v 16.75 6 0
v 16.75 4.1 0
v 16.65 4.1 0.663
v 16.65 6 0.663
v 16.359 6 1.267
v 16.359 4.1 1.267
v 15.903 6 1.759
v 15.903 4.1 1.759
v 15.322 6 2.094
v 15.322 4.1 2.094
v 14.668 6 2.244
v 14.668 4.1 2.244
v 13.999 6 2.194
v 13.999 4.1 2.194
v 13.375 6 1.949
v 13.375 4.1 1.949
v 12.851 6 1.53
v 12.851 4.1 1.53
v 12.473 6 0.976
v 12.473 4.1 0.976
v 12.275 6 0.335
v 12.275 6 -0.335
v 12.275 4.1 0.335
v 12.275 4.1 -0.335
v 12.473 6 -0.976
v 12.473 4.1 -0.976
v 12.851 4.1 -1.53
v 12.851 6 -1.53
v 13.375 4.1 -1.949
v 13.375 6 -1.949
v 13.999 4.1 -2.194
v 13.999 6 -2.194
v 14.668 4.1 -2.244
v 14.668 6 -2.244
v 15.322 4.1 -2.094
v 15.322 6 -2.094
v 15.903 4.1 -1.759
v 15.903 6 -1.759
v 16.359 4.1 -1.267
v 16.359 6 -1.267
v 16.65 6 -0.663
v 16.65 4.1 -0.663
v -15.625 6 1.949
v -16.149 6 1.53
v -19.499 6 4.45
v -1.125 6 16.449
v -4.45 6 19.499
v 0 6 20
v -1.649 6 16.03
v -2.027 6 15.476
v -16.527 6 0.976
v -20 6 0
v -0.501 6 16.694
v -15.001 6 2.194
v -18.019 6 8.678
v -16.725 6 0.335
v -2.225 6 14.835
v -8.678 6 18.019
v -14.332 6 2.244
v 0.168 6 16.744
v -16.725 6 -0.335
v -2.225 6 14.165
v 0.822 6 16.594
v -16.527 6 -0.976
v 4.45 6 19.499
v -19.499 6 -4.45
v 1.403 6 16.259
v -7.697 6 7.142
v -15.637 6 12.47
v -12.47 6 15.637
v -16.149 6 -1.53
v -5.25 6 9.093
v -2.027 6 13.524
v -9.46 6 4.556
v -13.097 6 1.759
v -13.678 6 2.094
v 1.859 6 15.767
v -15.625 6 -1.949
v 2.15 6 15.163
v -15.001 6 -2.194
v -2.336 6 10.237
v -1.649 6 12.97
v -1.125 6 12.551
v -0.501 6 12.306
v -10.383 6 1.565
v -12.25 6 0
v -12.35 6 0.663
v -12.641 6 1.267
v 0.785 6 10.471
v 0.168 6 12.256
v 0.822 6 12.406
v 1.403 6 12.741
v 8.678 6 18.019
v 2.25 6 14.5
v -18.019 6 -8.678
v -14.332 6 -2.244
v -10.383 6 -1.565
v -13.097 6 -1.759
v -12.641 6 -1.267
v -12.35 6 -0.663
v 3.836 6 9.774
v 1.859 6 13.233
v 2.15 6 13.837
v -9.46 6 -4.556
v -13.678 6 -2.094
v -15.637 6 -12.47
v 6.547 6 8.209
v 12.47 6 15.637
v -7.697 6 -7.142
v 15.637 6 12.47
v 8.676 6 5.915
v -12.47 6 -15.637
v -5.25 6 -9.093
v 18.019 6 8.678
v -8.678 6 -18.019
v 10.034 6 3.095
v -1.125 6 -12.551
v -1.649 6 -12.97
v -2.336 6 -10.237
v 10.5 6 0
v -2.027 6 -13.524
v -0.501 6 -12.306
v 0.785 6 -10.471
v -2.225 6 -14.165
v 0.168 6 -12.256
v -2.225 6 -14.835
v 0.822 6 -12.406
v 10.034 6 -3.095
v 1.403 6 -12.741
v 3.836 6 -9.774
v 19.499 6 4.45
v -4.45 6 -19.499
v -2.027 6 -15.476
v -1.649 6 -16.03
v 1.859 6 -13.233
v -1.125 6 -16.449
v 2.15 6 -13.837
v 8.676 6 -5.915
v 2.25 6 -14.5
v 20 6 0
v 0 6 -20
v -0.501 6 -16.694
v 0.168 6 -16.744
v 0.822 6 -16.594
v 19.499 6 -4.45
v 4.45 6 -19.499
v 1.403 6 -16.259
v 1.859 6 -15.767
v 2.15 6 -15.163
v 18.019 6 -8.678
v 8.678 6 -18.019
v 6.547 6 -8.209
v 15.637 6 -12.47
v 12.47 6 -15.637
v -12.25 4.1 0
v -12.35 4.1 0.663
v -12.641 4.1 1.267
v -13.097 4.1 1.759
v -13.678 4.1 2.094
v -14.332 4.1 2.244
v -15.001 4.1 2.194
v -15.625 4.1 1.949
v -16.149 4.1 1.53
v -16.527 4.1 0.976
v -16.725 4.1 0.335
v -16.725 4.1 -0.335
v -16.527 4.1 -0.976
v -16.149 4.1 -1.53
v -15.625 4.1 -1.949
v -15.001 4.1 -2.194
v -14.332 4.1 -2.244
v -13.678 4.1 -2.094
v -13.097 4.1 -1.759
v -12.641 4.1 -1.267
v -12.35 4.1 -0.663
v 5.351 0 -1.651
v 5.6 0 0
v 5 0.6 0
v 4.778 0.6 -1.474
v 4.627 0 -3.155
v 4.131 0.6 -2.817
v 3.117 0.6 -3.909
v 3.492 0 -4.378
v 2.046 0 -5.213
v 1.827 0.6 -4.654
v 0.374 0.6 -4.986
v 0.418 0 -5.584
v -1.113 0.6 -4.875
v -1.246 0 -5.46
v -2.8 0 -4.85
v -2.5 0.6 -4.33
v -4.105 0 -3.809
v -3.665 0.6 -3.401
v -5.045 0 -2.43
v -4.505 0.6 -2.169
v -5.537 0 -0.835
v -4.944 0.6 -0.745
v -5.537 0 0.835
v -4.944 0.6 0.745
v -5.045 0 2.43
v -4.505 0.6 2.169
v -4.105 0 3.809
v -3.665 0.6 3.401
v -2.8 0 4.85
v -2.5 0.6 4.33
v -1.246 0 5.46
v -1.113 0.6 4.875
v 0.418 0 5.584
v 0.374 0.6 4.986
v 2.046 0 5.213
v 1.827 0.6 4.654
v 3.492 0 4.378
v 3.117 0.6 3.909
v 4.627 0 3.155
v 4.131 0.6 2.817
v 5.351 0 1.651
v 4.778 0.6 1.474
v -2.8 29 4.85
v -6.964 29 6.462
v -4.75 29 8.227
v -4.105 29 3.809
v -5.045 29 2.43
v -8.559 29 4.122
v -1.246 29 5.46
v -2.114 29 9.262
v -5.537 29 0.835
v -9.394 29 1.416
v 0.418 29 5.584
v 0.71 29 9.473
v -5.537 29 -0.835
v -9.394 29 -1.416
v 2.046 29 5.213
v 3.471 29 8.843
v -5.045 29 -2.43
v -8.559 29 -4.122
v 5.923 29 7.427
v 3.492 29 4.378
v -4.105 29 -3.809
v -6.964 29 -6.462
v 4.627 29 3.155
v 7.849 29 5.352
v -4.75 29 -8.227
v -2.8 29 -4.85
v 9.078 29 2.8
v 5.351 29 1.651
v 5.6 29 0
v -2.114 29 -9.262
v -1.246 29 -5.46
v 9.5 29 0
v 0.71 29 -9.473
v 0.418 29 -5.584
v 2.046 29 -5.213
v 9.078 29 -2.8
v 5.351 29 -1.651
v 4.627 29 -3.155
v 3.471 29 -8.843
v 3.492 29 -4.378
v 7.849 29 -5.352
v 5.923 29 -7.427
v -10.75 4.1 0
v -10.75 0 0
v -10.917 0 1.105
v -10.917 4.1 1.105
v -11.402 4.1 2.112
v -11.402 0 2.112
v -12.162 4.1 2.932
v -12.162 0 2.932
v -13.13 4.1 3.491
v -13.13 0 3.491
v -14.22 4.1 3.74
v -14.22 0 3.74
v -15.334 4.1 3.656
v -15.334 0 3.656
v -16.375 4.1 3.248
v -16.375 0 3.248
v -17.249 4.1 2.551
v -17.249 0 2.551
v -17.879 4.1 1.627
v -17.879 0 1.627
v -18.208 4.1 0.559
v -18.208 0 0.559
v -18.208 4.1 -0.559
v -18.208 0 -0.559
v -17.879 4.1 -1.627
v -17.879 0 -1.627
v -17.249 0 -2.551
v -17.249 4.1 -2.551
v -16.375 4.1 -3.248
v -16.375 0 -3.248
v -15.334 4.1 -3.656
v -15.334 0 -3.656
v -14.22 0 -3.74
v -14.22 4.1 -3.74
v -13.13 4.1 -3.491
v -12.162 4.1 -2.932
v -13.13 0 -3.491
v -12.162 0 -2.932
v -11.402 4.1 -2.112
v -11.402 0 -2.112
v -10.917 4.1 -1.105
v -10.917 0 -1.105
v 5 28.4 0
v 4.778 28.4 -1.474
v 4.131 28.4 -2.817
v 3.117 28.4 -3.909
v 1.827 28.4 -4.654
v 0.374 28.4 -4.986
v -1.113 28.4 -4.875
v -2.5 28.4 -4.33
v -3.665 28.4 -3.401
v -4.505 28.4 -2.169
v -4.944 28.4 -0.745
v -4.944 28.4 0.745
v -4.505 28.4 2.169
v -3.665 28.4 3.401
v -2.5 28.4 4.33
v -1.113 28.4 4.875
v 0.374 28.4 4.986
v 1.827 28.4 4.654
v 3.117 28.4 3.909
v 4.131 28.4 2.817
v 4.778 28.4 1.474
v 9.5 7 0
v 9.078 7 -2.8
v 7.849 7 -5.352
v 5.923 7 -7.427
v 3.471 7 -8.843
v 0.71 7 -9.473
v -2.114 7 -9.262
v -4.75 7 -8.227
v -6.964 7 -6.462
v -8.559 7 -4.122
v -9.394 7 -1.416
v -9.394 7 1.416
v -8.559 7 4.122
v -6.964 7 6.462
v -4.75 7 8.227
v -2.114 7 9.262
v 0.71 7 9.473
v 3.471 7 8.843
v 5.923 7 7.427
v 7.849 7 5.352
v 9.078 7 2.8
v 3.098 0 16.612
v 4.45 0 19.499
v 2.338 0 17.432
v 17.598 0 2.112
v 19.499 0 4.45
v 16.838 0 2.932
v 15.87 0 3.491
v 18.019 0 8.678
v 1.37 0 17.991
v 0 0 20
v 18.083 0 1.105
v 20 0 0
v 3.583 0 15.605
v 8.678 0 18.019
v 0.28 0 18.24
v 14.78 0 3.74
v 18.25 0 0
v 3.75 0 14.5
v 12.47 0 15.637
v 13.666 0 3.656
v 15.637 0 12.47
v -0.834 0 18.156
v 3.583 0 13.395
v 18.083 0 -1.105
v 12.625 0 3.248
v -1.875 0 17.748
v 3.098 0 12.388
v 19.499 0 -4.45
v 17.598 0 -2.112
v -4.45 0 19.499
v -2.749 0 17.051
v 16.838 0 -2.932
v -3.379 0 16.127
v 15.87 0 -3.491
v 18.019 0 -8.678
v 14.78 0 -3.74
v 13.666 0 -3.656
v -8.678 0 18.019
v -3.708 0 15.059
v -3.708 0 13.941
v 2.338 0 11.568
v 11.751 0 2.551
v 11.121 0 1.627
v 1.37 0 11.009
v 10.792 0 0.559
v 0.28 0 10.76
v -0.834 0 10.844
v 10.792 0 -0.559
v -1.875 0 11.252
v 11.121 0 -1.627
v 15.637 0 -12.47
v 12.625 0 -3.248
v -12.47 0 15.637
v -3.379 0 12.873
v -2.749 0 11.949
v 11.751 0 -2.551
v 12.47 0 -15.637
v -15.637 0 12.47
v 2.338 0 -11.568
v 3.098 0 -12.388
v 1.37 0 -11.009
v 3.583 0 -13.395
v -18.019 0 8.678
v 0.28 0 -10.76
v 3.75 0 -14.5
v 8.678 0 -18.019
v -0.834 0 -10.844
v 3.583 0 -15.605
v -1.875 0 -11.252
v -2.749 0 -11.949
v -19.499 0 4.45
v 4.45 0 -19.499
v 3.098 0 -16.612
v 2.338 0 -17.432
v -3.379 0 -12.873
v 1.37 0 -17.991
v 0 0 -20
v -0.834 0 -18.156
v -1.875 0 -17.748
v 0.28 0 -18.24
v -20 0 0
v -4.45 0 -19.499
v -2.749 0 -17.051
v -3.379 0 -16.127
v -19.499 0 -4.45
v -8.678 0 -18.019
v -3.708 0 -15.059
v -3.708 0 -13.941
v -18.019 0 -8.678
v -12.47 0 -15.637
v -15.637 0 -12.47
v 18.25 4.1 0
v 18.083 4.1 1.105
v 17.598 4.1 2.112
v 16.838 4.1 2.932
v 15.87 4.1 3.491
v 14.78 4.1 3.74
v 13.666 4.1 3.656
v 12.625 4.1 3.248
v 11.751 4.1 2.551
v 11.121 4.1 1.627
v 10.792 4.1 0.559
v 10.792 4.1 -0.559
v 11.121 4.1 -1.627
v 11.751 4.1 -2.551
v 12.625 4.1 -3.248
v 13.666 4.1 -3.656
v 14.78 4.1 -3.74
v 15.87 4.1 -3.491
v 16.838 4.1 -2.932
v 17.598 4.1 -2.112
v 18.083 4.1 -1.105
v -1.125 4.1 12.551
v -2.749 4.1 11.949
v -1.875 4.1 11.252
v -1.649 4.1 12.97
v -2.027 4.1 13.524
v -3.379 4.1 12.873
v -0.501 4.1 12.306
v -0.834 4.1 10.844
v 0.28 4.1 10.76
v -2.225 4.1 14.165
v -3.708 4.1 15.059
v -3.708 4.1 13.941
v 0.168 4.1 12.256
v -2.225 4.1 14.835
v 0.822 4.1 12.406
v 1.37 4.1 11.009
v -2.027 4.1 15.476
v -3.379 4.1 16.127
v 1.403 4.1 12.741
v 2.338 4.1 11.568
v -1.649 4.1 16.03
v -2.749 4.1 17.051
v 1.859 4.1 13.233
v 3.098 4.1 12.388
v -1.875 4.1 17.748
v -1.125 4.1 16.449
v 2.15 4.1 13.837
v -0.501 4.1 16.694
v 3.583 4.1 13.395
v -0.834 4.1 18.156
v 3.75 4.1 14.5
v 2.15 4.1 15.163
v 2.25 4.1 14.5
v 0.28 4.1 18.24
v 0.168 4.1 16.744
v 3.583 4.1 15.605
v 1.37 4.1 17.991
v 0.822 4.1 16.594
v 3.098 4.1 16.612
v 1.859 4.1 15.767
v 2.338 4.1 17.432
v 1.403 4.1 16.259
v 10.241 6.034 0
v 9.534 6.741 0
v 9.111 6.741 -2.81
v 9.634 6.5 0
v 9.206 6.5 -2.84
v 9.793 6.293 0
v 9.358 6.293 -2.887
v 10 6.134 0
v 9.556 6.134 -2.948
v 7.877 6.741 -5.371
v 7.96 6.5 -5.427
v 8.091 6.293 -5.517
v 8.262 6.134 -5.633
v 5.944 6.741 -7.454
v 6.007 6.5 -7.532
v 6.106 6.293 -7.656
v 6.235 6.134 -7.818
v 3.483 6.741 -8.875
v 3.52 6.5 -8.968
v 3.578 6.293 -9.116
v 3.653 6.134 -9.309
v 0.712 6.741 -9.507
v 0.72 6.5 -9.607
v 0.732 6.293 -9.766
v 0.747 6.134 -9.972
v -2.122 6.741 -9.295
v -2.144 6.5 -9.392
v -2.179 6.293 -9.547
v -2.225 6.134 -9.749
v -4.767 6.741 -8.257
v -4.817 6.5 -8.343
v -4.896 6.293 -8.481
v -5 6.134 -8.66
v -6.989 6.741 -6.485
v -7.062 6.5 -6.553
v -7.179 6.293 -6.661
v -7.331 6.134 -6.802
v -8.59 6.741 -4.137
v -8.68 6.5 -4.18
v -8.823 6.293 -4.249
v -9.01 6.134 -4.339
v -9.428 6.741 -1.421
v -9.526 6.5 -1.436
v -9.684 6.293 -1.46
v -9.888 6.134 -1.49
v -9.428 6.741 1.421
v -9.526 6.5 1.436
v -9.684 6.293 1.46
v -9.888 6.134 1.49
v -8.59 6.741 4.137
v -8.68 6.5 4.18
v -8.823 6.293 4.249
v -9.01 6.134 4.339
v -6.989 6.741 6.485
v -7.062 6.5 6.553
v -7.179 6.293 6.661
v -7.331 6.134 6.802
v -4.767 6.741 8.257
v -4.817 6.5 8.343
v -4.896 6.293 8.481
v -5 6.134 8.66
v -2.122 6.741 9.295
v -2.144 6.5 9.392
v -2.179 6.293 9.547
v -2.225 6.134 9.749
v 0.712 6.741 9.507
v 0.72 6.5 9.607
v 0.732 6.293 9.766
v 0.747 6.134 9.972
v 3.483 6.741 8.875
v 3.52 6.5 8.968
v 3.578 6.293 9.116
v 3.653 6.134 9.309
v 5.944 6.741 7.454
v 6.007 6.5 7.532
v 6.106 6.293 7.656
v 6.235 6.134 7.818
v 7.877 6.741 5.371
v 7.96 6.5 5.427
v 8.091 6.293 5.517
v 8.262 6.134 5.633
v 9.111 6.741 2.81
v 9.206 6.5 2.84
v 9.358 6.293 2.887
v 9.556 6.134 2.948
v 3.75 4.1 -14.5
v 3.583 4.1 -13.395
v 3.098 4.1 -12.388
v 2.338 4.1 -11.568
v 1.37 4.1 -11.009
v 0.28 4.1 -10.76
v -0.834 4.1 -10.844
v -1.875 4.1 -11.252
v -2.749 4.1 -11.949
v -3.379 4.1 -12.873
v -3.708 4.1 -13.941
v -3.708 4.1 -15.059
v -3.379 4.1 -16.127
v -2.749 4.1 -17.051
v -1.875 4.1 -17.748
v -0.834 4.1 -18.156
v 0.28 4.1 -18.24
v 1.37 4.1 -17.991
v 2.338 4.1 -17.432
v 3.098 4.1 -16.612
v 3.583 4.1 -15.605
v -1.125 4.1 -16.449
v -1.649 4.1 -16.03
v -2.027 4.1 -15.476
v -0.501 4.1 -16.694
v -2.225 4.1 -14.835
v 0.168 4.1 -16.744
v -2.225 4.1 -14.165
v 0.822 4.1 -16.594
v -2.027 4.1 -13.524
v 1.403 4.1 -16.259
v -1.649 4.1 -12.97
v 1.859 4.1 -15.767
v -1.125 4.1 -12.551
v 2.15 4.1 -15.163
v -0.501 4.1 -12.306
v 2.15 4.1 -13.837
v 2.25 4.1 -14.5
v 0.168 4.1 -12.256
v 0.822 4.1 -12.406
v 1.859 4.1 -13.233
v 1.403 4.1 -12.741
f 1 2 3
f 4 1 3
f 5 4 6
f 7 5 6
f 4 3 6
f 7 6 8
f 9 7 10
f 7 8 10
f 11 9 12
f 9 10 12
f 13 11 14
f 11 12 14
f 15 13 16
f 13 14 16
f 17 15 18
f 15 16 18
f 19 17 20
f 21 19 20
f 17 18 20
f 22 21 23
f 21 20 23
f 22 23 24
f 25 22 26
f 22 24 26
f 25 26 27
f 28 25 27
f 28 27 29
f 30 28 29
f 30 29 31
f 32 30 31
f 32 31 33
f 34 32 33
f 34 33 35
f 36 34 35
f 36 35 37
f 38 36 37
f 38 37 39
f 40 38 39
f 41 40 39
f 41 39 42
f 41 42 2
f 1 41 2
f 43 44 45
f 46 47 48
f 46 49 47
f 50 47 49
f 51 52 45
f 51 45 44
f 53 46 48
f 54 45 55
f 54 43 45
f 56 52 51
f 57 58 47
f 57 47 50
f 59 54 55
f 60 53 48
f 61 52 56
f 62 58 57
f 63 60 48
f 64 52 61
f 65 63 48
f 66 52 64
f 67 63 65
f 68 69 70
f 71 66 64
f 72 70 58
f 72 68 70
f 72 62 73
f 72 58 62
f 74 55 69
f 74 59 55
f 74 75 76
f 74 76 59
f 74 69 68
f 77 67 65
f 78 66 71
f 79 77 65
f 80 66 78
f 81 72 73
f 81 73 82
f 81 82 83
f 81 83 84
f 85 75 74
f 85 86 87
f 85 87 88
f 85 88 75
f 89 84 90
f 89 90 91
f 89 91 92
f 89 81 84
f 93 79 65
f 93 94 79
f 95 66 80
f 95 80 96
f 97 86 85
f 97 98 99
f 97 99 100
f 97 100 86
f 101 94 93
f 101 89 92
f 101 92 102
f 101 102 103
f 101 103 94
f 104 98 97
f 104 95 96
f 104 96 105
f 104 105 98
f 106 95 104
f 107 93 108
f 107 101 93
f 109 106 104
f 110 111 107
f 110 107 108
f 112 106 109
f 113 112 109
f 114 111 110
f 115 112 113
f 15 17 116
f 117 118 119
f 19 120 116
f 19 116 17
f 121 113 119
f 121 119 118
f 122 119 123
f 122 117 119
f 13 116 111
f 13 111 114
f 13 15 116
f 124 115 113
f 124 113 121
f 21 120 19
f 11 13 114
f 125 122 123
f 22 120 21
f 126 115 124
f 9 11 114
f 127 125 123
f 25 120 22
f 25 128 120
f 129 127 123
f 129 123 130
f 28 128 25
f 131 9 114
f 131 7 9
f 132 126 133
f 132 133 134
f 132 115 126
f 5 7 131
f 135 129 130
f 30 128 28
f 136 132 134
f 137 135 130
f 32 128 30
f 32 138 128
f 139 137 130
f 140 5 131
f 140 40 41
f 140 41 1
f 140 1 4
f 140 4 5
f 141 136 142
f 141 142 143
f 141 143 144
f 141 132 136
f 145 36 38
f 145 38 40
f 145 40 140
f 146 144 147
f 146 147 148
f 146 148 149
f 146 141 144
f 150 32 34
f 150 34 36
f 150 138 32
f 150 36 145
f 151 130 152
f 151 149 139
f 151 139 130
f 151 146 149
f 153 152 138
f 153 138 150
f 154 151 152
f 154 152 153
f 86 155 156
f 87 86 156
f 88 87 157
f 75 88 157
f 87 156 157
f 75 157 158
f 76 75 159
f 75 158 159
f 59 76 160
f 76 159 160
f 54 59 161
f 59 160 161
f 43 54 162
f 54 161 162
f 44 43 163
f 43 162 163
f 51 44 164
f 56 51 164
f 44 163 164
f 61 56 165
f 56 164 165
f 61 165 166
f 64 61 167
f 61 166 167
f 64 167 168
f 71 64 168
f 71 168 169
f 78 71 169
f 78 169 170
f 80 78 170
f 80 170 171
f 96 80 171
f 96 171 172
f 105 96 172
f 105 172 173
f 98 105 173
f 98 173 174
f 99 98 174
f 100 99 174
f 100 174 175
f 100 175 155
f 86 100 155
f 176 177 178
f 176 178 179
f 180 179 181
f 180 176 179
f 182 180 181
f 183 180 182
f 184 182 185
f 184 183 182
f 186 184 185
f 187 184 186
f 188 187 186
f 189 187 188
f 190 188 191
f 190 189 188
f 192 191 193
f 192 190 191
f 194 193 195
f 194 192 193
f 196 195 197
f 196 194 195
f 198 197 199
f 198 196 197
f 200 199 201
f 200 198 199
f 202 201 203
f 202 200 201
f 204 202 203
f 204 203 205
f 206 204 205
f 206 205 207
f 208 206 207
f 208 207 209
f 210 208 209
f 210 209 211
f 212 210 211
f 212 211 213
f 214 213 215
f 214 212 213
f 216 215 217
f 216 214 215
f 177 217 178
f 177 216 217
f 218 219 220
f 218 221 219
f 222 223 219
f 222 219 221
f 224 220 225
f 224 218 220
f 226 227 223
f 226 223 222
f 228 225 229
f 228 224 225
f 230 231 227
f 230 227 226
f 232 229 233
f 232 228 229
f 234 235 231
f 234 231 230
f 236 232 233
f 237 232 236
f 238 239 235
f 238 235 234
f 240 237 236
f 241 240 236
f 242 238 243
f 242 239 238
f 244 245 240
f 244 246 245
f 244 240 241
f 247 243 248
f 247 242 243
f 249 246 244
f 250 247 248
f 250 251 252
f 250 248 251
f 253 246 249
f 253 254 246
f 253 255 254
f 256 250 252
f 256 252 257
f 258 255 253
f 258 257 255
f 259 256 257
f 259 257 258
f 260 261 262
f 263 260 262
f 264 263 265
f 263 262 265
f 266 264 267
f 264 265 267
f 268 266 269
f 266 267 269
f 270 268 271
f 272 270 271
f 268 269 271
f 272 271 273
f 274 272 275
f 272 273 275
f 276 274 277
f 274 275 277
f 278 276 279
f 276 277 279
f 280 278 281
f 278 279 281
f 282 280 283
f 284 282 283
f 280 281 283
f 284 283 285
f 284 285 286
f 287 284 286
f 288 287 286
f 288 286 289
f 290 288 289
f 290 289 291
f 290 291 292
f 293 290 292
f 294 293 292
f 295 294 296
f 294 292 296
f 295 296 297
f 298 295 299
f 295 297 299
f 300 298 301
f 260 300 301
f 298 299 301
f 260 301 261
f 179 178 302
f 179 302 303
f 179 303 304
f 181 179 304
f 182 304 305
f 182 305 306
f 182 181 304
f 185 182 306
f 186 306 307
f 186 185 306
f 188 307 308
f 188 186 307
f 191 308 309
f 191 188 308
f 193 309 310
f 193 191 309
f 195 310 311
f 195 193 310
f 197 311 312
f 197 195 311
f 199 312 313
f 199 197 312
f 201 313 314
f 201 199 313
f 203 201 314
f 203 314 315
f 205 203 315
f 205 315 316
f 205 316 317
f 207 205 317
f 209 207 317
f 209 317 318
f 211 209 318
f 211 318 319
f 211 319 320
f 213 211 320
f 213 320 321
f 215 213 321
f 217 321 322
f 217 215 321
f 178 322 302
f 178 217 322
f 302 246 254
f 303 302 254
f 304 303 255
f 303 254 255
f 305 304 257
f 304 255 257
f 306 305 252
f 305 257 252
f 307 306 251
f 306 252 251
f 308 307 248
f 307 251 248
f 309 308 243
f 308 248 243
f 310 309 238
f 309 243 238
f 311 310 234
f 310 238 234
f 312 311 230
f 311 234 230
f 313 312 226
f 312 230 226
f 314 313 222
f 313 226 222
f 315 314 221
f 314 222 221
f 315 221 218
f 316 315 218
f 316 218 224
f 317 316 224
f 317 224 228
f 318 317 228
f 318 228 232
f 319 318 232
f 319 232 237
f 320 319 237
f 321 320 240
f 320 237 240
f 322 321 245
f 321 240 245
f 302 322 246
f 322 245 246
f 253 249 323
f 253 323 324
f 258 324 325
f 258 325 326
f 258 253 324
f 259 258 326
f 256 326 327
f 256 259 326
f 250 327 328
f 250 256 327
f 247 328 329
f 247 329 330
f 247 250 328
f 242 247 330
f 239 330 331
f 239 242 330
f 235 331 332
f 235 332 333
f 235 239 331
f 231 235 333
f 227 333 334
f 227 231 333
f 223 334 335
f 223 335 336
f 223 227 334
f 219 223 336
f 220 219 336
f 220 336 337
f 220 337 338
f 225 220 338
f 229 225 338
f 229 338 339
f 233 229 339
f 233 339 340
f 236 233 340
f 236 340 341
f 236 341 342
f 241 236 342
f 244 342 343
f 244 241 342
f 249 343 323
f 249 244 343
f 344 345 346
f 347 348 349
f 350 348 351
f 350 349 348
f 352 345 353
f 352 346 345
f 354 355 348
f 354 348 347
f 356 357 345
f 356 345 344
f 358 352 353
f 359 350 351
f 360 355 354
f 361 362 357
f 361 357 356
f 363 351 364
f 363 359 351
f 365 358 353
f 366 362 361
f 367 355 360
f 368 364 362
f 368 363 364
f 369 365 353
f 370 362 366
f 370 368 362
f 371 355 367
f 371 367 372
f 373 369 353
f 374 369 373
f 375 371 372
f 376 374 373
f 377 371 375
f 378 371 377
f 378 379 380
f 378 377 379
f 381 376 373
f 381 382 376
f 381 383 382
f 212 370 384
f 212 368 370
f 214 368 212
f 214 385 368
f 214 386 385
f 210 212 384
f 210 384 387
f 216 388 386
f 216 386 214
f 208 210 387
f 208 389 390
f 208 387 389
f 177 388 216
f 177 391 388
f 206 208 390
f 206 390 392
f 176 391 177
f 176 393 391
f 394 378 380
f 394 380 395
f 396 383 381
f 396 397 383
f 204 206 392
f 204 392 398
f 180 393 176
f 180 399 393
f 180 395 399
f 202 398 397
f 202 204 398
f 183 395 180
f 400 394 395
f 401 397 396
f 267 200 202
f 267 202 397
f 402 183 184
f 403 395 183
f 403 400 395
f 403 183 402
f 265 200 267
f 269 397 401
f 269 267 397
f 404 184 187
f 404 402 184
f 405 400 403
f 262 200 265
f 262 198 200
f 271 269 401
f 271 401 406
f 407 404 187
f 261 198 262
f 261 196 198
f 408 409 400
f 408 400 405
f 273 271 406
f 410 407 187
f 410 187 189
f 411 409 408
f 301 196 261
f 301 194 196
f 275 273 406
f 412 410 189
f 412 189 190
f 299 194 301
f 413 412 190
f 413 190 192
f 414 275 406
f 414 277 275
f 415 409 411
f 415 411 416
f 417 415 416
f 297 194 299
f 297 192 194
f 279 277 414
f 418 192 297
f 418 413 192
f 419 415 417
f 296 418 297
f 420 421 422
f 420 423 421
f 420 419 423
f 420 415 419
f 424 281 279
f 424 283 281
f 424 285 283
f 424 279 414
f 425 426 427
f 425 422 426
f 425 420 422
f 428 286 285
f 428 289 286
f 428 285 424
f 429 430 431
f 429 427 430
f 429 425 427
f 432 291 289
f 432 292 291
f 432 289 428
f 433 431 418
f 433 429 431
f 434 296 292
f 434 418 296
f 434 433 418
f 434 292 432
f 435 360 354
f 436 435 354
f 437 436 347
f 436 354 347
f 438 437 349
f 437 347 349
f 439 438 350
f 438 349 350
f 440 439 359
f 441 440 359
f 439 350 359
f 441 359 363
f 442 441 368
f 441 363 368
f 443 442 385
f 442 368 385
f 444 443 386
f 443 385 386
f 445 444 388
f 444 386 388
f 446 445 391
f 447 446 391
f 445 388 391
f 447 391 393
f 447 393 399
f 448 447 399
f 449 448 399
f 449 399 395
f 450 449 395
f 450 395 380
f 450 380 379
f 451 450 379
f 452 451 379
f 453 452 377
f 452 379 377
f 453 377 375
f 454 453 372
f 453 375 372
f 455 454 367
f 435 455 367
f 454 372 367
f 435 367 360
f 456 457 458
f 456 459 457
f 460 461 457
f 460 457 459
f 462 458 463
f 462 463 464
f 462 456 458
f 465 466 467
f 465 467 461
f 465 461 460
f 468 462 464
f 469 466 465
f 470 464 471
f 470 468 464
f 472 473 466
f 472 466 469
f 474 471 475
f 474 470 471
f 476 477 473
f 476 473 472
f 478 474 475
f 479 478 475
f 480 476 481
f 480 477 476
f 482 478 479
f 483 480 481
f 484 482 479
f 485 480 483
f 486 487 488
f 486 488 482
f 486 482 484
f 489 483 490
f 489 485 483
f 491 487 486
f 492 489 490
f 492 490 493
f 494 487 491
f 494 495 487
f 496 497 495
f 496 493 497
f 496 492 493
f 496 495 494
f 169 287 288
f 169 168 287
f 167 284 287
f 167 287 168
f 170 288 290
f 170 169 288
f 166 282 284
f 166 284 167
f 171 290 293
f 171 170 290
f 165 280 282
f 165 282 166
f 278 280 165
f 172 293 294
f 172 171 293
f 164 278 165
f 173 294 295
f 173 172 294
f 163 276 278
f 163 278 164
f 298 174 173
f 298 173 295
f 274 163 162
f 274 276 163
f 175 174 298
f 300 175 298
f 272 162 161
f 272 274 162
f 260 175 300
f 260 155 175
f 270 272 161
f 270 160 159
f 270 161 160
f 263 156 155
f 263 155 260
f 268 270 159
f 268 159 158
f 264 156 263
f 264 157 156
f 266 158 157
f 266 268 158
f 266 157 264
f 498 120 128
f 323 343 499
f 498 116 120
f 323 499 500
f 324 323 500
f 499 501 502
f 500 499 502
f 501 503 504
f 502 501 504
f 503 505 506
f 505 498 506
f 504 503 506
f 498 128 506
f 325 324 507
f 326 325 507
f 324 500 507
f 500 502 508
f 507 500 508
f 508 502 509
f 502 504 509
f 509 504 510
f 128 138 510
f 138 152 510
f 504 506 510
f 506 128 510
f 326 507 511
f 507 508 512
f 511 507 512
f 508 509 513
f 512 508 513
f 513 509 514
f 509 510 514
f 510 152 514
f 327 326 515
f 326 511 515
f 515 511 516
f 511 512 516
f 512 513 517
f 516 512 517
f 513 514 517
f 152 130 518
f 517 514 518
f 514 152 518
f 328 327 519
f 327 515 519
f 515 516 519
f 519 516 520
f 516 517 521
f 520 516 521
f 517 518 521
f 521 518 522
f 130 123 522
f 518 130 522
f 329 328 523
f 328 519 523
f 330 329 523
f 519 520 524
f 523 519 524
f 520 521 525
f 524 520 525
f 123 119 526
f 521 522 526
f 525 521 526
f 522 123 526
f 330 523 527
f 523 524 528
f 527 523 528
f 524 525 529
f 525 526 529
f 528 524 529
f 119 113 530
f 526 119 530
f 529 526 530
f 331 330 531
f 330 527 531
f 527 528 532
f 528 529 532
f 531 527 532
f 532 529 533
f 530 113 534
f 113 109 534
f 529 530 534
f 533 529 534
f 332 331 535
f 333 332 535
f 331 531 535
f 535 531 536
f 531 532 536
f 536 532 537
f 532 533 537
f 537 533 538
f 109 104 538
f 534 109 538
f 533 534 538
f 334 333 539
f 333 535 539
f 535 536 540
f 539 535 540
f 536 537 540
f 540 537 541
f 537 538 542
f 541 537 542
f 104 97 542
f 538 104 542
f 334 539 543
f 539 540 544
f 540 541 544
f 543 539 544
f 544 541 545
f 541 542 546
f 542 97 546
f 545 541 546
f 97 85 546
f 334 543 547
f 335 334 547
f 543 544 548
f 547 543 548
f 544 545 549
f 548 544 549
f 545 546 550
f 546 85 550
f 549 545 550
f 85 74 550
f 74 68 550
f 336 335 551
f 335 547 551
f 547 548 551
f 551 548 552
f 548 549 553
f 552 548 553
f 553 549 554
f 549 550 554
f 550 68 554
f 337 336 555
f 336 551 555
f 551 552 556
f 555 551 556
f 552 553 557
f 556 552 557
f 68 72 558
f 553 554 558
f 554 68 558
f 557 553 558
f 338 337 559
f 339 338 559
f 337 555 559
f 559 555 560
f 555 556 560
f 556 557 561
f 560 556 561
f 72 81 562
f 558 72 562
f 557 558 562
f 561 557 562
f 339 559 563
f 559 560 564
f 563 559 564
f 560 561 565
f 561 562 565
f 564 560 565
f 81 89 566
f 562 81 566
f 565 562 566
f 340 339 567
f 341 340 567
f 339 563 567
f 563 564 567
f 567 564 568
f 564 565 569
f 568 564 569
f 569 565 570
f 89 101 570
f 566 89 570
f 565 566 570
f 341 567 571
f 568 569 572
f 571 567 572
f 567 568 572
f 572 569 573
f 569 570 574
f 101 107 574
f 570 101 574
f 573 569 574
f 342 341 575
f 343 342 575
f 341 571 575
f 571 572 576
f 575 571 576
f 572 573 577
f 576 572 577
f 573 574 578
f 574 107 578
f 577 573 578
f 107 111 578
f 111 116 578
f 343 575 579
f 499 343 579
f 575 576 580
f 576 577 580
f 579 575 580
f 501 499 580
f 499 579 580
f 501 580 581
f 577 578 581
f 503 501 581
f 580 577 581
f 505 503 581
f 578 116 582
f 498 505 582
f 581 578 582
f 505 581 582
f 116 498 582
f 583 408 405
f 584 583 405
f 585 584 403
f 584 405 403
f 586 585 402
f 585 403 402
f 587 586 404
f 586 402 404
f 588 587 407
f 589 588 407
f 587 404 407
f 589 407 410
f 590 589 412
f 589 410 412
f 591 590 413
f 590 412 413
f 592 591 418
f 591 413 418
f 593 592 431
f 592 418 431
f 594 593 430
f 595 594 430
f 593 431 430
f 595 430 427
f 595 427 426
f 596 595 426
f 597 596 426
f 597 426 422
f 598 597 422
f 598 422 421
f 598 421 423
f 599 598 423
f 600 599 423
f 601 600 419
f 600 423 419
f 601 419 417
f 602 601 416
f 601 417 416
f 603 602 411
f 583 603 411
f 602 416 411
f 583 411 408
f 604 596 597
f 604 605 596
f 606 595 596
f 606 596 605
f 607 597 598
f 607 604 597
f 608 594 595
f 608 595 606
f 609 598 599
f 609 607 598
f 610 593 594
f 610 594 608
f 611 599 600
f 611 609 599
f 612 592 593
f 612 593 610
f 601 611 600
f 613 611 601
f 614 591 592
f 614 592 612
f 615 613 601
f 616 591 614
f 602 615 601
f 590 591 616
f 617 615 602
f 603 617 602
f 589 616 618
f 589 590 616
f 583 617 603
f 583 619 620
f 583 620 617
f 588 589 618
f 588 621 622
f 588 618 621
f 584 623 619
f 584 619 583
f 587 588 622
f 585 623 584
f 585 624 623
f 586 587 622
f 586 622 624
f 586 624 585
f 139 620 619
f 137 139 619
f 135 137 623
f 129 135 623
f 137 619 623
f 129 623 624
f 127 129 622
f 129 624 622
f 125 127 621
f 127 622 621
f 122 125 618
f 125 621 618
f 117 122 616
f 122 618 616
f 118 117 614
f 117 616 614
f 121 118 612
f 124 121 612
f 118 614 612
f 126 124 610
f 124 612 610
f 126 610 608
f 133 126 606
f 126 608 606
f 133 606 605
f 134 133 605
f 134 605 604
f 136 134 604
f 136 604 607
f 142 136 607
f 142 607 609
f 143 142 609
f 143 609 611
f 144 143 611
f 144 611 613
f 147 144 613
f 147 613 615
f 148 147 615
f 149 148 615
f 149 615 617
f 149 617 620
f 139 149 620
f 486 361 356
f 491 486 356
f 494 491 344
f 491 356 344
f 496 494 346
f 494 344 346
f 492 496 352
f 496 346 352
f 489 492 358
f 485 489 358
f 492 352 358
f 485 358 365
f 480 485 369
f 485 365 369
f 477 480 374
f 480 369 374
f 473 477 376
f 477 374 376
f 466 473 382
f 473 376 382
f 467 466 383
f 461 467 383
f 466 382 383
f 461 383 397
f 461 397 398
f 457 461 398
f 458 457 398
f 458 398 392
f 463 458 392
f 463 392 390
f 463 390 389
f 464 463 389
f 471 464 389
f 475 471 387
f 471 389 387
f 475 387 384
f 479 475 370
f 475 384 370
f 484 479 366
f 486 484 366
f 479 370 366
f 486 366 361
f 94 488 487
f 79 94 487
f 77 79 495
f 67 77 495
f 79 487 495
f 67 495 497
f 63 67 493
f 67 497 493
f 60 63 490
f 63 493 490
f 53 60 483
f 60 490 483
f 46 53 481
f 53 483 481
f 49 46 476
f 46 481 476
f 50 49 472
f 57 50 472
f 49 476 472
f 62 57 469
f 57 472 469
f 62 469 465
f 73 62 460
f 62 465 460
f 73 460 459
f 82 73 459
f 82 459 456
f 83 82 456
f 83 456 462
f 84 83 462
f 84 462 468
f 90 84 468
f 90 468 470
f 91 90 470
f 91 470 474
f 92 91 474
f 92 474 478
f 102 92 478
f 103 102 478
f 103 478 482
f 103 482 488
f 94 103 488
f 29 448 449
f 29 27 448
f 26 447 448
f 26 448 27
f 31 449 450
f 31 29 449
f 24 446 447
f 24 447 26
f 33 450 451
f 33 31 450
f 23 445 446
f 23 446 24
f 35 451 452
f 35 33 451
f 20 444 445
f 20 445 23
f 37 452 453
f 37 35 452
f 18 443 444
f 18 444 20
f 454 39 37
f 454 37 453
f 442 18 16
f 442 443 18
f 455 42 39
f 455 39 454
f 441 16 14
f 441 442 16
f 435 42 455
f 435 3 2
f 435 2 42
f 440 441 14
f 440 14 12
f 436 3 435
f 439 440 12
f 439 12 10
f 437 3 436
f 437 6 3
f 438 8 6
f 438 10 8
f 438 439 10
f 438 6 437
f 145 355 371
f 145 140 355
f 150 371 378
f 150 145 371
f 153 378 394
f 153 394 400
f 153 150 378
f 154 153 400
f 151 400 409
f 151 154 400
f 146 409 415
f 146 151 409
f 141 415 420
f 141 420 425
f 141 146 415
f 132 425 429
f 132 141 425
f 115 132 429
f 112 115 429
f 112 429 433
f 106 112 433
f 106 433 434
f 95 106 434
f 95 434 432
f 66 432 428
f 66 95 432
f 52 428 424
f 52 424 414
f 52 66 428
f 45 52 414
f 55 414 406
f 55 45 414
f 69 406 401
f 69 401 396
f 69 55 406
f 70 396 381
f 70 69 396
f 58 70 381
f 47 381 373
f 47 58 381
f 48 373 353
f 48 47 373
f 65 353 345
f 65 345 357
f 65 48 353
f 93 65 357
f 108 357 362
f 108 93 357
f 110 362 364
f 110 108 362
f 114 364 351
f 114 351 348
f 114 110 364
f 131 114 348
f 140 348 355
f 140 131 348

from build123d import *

# Parameters (mm, degrees)
F2_R     = 2.25
F3_DEPTH = 29.001
F4_R     = 3.75
F5_DEPTH = 4.1
F6_SIZE  = 0.6
F7_R     = 1


with BuildPart() as f1:
    # F0 (on Top) → F1 (revolve)
    with BuildSketch(Plane.XY):
        Polygon((5, 29), (5, 0), (20, 0), (20, 6), (9.5, 6), (9.5, 29), align=None)
    revolve(axis=Axis((0, 11.864793, 0), (0, 1, 0)))

    # F2 (on face) → F3 (cut, through all)
    with BuildSketch(Plane.XZ):
        with Locations((0, 14.5)):
            Circle(F2_R)
        with Locations((0, -14.5)):
            Circle(F2_R)
        with Locations((14.5, 0)):
            Circle(F2_R)
        with Locations((-14.5, 0)):
            Circle(F2_R)
    extrude(amount=-F3_DEPTH, mode=Mode.SUBTRACT)

    # F4 (on face) → F5 (cut)
    with BuildSketch(Plane.XZ):
        with Locations((0, 14.5)):
            Circle(F4_R)
        with Locations((14.5, 0)):
            Circle(F4_R)
        with Locations((0, -14.5)):
            Circle(F4_R)
        with Locations((-14.5, 0)):
            Circle(F4_R)
    extrude(amount=-F5_DEPTH, mode=Mode.SUBTRACT)

    # F6
    f6_edges = [f1.edges().sort_by_distance(p)[0] for p in [
        (5, 14.5, 0),
        (-5, 0, 0),
        (-5, 29, 0),
    ]]
    chamfer(f6_edges, length=F6_SIZE)

    # F7
    f7_edges = [f1.edges().sort_by_distance(p)[0] for p in [
        (-9.5, 6, 0),
    ]]
    fillet(f7_edges, radius=F7_R)


solid = f1.part
